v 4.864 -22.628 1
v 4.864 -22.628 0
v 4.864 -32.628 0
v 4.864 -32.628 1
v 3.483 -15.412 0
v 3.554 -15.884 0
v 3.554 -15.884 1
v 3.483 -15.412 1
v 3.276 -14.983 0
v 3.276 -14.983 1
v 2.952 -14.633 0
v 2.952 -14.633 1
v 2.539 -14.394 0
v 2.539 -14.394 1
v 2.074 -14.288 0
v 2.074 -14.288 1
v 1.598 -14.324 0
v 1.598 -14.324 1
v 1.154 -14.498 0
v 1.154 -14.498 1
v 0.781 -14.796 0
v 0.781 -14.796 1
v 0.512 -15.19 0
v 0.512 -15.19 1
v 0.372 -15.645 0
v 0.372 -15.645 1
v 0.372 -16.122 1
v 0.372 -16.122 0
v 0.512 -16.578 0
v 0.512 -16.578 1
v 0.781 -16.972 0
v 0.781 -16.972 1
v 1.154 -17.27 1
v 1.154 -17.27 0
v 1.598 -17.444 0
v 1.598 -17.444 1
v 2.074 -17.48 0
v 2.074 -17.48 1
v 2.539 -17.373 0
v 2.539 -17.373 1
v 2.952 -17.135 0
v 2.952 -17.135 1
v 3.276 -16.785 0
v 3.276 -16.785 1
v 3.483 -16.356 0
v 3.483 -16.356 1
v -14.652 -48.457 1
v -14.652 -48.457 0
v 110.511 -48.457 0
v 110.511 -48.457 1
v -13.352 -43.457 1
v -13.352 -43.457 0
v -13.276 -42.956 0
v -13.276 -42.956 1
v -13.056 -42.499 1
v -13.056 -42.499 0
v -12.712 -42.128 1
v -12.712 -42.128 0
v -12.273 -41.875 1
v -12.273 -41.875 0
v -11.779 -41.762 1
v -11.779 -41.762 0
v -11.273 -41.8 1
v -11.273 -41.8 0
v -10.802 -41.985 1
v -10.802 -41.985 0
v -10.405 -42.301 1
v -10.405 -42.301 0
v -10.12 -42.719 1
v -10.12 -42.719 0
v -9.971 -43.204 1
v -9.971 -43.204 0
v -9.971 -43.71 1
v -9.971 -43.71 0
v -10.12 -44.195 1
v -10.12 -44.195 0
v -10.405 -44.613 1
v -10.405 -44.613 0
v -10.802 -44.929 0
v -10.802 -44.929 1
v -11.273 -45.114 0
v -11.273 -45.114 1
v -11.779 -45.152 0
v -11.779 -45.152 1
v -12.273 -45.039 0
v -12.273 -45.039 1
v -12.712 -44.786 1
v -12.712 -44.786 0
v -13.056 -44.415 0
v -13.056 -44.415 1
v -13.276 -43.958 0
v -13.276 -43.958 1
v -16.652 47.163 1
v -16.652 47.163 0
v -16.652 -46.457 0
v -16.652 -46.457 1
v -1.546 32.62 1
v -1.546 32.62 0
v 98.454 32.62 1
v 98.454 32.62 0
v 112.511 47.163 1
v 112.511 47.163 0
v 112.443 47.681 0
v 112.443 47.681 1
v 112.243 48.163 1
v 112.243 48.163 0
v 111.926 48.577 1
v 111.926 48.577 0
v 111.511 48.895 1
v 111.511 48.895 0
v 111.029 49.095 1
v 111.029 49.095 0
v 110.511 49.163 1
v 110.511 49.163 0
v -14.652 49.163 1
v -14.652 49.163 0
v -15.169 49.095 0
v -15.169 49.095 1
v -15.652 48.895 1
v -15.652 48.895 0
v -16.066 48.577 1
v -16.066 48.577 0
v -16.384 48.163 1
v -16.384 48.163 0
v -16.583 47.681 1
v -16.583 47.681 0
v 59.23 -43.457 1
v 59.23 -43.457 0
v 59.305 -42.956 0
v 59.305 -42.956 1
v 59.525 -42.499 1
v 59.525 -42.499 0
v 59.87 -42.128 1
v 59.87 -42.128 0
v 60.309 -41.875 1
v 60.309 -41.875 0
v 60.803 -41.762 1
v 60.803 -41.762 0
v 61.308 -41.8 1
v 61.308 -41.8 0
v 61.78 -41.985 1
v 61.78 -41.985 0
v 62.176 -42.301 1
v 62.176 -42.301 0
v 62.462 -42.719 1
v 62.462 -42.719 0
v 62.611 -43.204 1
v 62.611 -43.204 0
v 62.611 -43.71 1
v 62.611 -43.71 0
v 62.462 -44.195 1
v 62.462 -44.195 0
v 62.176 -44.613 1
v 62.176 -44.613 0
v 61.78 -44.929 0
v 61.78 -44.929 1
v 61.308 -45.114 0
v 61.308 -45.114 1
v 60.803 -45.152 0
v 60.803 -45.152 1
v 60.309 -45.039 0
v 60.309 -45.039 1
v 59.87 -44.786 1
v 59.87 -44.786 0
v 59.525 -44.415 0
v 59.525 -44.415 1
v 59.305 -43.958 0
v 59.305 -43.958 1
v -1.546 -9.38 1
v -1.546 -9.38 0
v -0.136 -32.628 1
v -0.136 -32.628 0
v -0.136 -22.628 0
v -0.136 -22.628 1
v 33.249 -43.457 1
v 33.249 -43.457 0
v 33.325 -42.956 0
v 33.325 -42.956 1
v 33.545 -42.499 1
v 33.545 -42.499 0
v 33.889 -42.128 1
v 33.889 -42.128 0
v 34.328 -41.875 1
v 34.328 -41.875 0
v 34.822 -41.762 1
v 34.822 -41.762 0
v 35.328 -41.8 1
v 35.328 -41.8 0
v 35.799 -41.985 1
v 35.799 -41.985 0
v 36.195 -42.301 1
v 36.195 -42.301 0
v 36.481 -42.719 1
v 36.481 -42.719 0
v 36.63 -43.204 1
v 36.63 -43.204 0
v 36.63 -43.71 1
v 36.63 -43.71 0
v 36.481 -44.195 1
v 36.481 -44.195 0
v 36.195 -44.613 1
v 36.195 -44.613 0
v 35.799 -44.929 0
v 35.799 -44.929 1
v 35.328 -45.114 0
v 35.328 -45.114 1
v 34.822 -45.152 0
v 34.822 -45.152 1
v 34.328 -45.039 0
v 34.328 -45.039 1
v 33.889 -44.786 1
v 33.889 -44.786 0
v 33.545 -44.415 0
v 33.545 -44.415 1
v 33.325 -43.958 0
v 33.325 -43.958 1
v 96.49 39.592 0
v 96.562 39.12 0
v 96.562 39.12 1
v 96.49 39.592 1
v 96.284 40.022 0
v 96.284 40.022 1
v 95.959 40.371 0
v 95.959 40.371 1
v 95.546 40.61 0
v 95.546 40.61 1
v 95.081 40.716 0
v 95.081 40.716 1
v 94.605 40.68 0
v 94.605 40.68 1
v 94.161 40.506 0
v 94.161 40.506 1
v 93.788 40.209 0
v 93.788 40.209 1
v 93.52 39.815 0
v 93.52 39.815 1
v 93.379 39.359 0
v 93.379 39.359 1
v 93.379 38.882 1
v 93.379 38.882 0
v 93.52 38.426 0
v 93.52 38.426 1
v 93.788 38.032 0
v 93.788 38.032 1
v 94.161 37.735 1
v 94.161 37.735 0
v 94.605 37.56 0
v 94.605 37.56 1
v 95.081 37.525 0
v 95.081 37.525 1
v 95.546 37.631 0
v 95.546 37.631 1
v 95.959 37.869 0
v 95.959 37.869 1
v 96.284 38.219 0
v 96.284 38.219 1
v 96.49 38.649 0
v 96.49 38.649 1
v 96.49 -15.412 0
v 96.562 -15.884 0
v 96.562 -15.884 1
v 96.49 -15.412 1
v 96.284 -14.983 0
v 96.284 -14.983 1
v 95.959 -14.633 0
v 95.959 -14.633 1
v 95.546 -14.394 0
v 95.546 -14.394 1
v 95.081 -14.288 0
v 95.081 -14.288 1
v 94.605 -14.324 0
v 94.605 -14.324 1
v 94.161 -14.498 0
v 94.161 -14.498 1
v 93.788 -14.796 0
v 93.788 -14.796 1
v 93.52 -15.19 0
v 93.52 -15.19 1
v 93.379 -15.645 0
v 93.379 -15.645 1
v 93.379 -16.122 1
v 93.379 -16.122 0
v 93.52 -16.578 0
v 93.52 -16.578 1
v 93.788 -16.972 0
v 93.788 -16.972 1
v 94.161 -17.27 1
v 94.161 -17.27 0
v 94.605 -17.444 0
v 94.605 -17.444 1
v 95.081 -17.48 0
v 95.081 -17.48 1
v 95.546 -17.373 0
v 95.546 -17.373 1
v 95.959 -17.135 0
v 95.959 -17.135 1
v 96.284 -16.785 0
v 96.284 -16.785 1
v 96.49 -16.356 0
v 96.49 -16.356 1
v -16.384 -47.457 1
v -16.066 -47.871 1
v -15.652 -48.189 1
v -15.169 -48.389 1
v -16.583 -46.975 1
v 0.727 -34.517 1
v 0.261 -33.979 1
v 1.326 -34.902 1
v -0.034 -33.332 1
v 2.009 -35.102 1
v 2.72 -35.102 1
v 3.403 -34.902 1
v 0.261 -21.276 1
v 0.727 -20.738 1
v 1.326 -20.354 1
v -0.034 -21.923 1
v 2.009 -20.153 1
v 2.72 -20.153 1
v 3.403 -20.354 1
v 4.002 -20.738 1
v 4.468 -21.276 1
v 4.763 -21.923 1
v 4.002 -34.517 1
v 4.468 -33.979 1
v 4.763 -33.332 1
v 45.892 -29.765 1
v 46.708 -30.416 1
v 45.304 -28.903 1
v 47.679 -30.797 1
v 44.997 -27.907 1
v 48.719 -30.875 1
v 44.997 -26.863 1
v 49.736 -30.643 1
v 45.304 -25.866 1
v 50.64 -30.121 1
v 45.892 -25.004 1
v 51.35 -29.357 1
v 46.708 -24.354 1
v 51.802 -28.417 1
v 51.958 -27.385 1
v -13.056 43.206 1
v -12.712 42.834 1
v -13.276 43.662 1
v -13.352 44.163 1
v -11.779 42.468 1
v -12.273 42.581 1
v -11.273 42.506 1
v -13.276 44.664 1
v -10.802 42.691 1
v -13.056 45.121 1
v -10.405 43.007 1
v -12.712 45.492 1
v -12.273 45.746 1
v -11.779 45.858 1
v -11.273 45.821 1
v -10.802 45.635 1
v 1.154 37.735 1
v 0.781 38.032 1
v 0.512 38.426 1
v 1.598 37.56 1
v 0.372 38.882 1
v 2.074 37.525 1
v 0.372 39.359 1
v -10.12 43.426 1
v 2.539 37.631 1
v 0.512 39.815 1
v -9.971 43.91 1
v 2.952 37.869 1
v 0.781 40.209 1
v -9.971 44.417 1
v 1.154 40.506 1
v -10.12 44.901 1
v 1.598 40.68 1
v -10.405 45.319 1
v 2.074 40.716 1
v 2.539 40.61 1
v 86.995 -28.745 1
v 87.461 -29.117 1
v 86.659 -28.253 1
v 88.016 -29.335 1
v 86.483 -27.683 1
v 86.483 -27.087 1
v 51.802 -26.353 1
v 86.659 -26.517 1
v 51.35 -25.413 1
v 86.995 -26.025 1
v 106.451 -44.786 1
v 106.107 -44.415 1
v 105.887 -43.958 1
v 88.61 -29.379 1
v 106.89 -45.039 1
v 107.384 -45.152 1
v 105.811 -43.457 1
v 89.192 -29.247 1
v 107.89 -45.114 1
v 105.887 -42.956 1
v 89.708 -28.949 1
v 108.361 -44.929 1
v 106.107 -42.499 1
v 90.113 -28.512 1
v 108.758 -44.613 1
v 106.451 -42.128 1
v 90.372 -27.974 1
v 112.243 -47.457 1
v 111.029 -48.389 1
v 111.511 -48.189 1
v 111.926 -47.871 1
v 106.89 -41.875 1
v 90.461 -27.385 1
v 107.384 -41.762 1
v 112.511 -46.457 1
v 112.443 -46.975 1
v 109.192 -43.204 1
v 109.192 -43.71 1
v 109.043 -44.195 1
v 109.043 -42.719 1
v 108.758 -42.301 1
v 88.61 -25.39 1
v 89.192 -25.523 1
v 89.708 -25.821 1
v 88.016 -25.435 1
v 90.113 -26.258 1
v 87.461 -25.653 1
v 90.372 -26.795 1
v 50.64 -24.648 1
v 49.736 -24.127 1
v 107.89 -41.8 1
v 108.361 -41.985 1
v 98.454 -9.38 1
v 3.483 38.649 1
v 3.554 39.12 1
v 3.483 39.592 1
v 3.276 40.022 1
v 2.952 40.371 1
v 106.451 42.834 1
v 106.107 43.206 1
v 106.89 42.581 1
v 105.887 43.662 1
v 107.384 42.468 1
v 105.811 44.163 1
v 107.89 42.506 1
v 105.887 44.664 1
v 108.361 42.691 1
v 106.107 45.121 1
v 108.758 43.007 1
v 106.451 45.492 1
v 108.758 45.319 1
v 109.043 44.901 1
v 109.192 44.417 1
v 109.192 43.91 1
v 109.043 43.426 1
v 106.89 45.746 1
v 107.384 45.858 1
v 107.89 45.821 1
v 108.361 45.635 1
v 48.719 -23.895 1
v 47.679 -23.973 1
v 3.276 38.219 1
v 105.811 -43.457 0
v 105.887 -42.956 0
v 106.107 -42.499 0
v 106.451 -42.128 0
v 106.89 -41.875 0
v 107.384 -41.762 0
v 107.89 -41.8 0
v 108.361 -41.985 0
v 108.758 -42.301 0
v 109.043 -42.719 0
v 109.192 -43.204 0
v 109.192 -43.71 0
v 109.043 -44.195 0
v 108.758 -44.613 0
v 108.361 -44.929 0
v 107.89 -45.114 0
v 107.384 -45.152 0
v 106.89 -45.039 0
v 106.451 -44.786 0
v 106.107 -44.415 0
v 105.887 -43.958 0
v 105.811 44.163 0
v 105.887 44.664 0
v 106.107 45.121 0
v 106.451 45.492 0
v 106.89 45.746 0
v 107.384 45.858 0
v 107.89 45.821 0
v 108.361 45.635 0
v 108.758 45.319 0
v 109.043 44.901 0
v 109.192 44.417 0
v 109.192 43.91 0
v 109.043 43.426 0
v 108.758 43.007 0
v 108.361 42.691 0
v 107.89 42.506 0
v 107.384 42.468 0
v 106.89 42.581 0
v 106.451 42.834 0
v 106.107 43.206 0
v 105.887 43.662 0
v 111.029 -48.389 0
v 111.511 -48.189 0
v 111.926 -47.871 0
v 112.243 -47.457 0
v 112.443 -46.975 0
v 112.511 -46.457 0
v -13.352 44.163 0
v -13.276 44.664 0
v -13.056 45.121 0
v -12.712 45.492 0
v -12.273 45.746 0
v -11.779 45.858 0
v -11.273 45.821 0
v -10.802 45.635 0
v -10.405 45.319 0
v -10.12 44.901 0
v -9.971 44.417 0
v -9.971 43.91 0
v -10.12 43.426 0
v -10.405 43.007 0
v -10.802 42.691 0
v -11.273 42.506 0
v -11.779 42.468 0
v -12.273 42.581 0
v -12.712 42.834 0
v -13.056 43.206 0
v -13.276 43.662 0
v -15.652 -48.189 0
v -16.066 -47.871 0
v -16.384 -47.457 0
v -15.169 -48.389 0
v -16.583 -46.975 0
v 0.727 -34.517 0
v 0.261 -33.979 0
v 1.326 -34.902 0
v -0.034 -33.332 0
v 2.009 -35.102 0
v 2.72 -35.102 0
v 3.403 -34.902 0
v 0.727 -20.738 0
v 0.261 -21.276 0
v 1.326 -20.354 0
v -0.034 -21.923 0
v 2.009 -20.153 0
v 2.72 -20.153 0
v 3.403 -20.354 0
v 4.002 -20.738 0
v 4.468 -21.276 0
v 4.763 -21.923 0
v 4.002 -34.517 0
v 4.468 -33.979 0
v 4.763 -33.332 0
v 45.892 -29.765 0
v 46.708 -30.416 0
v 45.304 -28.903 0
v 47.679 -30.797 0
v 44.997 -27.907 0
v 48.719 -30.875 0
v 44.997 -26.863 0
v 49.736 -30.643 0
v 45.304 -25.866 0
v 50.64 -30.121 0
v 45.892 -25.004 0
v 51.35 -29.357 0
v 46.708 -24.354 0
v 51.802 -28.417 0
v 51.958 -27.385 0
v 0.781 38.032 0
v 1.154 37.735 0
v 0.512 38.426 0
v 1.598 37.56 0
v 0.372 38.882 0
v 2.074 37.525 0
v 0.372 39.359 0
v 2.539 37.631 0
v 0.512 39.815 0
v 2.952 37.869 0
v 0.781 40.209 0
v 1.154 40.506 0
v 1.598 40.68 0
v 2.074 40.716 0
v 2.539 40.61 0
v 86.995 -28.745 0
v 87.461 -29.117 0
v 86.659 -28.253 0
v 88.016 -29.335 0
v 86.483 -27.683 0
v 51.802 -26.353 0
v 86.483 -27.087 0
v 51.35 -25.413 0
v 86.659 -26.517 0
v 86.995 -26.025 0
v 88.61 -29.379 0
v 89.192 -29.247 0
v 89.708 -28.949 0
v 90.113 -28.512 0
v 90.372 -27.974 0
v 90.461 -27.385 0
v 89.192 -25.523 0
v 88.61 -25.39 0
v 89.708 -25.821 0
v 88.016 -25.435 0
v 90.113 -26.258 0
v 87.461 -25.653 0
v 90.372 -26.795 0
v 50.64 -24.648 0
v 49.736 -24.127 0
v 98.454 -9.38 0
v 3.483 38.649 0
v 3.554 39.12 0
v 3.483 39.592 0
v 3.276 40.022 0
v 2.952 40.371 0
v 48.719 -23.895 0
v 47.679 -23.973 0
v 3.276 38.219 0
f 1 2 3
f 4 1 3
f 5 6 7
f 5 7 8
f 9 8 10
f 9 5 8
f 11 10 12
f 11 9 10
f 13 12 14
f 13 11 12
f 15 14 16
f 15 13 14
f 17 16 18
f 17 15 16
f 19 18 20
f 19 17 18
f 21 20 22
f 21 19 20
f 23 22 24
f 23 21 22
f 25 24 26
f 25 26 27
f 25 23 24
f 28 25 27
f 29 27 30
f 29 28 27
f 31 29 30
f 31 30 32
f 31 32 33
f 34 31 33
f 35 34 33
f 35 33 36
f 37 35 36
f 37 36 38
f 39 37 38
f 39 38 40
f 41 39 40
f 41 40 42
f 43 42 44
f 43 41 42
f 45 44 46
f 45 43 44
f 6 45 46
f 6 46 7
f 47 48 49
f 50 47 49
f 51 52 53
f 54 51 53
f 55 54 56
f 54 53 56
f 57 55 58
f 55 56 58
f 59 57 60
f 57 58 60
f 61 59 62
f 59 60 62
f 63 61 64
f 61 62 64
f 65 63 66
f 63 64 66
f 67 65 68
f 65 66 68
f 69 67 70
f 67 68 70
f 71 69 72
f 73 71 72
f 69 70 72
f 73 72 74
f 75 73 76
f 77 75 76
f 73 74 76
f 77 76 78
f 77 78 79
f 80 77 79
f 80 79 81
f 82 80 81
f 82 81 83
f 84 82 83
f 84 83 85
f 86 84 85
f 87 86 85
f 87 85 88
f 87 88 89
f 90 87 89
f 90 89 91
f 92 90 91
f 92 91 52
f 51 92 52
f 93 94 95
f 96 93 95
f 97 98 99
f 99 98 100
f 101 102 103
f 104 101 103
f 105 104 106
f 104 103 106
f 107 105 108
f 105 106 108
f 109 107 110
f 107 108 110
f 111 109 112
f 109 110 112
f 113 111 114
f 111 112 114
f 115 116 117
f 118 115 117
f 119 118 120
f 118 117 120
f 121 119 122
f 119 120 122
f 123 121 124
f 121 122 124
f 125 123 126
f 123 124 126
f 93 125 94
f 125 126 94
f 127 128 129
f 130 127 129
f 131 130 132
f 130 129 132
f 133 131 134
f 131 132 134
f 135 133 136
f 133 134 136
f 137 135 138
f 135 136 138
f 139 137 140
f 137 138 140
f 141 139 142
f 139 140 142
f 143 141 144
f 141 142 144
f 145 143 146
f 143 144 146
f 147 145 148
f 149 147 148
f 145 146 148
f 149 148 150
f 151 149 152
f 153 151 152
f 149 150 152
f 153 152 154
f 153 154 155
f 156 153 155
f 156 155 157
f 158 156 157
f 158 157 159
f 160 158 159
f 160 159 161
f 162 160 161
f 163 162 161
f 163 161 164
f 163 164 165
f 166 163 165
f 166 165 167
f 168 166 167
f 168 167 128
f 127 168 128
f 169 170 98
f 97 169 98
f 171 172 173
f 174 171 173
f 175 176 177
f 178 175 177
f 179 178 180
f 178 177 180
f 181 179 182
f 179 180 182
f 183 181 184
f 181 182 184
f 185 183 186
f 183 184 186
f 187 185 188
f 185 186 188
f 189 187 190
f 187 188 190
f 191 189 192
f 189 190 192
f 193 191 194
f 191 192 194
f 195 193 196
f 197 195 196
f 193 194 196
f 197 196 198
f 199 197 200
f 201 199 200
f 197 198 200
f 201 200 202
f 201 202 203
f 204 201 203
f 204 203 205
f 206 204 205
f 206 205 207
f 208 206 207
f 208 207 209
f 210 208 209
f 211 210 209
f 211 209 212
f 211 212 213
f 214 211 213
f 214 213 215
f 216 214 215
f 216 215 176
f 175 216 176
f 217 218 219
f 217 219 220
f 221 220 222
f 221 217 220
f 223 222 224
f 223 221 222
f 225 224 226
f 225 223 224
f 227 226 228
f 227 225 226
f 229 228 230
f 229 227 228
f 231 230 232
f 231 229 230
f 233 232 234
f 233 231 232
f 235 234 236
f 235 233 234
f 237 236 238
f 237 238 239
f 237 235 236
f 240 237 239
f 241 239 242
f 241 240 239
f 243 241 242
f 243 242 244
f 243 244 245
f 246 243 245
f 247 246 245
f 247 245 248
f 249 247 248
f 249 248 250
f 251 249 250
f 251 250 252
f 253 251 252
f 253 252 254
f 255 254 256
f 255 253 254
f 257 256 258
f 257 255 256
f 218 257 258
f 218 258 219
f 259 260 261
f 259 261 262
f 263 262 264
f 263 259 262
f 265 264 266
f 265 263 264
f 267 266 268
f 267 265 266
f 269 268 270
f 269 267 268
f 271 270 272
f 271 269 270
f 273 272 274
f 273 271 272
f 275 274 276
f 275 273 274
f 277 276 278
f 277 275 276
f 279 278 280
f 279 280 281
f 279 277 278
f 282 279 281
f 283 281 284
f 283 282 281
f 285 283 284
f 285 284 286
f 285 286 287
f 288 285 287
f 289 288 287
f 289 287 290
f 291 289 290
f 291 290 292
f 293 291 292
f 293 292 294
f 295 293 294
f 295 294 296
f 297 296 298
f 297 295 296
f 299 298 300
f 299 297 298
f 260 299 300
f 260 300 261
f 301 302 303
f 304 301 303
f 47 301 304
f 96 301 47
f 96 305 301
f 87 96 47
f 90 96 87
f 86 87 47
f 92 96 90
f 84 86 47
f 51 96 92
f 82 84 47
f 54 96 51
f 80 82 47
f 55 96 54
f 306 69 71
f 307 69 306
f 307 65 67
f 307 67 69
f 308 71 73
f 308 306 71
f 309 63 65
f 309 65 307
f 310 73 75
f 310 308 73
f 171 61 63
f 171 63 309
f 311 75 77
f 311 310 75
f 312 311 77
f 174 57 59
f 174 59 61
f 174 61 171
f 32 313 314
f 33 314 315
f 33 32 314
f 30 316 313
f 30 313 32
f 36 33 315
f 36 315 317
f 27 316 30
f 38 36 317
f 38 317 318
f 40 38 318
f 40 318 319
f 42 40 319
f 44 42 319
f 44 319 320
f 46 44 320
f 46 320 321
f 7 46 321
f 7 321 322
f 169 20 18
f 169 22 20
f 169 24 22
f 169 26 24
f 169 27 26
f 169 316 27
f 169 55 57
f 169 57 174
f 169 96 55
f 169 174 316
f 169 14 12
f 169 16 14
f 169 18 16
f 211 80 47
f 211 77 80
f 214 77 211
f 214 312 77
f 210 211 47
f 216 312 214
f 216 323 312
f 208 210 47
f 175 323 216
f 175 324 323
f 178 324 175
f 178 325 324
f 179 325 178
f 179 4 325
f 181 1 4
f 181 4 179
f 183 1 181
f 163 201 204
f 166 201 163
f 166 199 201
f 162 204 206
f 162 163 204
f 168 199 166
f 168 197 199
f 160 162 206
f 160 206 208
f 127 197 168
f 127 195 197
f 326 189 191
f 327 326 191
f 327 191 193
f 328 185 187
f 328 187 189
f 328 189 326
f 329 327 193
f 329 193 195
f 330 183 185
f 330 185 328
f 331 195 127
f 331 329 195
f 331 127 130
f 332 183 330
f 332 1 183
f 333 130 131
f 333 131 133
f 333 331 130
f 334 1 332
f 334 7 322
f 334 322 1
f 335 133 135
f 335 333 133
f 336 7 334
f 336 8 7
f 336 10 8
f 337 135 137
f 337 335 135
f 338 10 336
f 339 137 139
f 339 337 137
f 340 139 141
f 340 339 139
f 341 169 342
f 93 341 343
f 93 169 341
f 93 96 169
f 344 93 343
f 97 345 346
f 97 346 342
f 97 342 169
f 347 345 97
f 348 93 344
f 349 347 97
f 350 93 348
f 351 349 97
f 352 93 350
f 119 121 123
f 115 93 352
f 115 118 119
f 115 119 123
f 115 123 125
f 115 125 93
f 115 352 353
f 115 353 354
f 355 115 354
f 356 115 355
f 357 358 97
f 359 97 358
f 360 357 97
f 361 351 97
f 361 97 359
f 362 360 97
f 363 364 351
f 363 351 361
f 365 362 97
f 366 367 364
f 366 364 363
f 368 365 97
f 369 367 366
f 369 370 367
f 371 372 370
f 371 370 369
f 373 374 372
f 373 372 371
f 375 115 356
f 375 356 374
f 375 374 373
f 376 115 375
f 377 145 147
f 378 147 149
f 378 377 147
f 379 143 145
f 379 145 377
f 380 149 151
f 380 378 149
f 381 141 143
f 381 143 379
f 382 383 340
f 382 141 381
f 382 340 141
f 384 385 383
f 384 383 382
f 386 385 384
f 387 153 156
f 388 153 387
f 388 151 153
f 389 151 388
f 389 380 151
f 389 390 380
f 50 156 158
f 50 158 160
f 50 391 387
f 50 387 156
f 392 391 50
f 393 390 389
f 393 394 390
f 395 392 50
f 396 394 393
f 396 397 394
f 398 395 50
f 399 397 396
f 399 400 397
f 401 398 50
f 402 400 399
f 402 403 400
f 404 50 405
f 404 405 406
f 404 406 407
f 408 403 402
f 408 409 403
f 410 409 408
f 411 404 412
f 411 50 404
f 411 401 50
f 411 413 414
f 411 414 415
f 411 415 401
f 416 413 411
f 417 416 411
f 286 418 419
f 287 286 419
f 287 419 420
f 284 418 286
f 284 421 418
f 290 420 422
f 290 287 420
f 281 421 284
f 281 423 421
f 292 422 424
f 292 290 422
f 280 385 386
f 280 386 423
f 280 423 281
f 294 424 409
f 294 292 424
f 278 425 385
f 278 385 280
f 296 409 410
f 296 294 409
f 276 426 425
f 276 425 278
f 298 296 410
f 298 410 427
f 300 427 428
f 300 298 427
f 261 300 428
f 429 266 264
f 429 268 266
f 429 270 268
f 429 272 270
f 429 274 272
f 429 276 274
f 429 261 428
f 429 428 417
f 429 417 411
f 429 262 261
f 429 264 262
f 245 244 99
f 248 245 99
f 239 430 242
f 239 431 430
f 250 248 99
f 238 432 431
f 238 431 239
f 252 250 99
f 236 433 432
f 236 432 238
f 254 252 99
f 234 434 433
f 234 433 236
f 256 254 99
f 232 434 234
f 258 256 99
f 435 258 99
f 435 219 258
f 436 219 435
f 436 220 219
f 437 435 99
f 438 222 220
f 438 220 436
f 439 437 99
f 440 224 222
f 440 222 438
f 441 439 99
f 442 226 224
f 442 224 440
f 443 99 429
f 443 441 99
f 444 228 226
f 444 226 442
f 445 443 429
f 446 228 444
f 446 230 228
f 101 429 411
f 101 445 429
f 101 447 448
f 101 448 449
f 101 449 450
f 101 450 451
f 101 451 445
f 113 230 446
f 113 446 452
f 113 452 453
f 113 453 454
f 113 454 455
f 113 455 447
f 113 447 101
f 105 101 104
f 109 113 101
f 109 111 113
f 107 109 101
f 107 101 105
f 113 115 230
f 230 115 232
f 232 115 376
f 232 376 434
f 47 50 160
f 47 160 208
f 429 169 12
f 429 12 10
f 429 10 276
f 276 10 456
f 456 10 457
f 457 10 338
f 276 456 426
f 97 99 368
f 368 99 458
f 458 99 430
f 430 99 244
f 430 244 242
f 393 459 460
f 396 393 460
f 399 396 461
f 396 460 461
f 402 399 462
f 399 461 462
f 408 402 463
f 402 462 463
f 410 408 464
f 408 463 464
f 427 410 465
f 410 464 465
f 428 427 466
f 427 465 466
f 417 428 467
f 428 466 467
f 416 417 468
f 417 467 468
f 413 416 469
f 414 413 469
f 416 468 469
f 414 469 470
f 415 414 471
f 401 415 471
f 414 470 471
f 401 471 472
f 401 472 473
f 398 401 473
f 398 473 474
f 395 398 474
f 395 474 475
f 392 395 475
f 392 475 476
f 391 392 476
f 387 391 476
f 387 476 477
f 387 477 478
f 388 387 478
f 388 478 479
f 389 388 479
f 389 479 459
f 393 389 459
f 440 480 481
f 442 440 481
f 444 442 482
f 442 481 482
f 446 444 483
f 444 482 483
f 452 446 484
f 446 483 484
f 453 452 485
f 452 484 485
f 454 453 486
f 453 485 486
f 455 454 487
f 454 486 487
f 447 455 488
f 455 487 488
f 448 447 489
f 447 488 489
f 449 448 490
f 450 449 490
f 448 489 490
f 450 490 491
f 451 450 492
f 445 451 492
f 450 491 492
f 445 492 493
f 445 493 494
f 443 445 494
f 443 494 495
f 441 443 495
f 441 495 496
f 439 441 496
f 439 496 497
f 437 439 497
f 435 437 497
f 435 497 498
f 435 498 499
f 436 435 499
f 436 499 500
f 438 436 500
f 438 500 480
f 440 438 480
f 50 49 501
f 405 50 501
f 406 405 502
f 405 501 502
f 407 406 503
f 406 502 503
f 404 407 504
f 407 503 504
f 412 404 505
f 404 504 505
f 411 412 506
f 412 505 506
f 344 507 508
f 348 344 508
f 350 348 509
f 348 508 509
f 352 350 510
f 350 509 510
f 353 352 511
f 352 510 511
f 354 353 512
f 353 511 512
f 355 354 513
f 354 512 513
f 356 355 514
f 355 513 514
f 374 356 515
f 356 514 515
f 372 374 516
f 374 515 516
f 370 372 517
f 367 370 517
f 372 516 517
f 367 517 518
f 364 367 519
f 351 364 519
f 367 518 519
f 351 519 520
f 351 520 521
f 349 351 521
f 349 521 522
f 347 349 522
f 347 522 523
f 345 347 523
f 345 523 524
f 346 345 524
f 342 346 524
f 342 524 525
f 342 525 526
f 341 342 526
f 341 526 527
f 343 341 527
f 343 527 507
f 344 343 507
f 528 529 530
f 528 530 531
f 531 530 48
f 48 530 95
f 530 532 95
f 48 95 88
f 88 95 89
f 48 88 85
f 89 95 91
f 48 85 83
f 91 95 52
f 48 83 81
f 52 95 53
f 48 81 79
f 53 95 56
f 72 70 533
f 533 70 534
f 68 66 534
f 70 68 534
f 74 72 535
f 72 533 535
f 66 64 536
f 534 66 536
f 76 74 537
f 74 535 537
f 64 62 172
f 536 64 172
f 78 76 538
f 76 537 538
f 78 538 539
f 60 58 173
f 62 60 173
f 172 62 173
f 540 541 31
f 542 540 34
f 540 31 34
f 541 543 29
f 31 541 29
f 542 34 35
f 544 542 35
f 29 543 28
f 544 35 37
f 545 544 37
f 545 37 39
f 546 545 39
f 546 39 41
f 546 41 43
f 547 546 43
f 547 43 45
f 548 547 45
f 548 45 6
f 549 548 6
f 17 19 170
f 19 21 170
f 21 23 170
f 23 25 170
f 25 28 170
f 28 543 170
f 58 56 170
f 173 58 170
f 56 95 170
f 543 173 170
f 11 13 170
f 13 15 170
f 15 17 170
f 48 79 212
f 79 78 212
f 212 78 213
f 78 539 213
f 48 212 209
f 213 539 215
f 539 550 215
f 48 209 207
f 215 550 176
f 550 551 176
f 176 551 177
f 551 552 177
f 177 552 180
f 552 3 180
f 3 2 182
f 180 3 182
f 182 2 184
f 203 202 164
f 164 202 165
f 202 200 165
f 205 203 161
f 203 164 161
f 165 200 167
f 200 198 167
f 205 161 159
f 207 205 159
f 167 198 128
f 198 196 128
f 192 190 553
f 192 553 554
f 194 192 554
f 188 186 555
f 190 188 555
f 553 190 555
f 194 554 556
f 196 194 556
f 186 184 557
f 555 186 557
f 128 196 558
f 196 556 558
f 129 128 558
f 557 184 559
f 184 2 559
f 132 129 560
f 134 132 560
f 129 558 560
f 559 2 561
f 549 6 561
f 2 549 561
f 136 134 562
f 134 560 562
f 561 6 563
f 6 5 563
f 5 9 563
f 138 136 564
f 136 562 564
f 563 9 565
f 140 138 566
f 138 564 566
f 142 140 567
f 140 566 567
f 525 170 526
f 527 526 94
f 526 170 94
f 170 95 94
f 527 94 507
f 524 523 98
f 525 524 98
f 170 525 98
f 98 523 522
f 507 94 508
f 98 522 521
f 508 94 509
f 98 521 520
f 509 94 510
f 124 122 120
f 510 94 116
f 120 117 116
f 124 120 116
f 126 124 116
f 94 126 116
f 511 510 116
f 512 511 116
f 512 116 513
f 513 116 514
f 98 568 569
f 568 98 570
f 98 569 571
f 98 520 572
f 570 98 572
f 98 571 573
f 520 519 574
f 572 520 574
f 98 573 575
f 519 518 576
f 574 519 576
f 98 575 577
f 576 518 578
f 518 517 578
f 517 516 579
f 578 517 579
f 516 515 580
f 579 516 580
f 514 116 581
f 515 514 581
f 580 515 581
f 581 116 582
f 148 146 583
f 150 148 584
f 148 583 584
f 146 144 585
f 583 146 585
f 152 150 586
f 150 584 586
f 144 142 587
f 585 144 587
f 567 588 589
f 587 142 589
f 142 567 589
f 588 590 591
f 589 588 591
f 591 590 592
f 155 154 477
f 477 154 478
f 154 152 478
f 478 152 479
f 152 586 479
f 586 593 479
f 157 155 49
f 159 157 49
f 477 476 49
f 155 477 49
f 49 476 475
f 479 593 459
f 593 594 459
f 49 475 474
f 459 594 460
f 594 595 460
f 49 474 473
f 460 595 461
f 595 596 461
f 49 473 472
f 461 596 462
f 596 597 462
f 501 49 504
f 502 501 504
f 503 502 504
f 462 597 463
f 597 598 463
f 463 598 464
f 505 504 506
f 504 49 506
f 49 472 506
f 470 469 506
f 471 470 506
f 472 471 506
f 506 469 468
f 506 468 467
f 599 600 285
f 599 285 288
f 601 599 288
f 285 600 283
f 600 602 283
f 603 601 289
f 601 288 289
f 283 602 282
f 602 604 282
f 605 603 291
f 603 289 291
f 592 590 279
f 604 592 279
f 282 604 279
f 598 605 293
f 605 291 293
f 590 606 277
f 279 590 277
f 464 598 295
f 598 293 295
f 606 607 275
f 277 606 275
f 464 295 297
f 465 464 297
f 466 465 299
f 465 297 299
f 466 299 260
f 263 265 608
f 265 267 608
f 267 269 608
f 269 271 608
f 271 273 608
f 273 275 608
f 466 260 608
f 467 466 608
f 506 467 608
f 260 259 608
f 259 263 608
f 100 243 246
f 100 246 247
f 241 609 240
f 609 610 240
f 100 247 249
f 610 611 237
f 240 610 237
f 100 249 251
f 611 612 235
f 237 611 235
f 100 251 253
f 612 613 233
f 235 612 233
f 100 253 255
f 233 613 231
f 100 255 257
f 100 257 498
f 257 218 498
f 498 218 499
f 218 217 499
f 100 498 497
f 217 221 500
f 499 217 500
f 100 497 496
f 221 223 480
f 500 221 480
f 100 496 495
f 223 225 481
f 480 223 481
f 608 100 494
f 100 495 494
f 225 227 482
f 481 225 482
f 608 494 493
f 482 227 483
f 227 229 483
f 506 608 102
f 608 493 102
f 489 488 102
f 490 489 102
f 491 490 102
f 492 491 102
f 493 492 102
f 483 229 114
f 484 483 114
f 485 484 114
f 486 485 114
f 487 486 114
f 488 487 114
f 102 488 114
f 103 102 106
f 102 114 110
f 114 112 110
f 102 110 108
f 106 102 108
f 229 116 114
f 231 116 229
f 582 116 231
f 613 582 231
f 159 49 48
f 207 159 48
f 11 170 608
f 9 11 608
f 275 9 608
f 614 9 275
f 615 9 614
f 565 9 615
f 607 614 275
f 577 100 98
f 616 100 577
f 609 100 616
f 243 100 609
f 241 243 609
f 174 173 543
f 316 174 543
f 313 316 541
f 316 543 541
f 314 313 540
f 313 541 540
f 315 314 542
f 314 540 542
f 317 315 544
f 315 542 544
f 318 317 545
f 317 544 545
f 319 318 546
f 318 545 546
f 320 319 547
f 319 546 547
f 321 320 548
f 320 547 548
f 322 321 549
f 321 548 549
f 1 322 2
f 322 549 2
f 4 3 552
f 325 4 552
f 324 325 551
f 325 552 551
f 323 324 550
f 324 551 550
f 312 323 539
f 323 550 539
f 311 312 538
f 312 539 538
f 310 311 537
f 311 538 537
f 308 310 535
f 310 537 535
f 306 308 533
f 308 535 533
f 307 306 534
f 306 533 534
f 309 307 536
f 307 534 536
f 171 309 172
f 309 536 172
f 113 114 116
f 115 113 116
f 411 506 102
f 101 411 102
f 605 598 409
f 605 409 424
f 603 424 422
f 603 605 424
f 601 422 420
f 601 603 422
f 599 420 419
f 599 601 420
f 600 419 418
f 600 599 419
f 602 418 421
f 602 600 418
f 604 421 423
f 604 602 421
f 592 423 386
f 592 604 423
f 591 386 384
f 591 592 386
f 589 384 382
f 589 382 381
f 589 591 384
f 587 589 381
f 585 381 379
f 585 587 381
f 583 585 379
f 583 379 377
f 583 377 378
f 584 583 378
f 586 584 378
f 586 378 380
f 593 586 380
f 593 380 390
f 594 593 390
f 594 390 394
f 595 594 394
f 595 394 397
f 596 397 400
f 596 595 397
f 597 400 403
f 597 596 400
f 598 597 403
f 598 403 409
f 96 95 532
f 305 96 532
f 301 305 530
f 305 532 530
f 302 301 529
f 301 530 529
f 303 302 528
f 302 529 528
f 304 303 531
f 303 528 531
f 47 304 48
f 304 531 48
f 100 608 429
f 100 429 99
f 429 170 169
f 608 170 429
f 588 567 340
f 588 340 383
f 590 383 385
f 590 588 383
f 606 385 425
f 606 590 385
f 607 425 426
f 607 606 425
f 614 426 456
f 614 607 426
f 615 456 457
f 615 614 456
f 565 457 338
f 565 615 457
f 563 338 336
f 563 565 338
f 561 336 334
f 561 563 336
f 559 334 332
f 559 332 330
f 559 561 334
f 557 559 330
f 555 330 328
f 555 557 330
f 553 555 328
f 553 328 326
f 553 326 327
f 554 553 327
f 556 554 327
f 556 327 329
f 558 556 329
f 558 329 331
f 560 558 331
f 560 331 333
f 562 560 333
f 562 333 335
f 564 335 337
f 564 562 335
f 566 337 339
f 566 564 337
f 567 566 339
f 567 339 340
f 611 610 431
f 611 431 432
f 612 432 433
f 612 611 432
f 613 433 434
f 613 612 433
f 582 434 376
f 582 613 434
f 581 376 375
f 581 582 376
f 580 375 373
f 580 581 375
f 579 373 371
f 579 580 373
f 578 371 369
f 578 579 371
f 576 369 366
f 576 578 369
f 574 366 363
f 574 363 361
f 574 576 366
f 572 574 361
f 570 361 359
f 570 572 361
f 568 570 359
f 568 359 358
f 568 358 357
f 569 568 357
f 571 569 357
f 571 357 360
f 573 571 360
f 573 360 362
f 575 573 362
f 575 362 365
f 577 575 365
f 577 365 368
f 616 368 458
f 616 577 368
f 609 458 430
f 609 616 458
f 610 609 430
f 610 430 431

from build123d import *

# Parameters (mm, degrees)
BOSS_EXTRUDE1_OUTLINE_R   = 1.600127185
BOSS_EXTRUDE1_OUTLINE_R_2 = 3.5
BOSS_EXTRUDE1_OUTLINE_R_3 = 2
BOSS_EXTRUDE1_OUTLINE_W   = 100
BOSS_EXTRUDE1_OUTLINE_H   = 42
BOSS_EXTRUDE1_DEPTH       = 1
M3_CLEARANCE_HOLE1_D      = 3.4
M3_CLEARANCE_HOLE1_DEPTH  = 4
M3_CLEARANCE_HOLE1_TIP    = 1.021463052


# Read off the part's stored shape, not the designer's step: Boss-Extrude1
with BuildPart() as part:
    # Boss-Extrude1 outline → Boss-Extrude1 (new body)
    with BuildSketch(Plane.XY):
        with BuildLine():
            ThreePointArc((110.511379674, -48.456994218), (111.925593237, -47.871207781), (112.511379674, -46.456994218))
            Line((112.511379674, -46.456994218), (112.511379674, 47.163183245))
            ThreePointArc((112.511379674, 47.163183245), (111.925593236, 48.577396807), (110.511379674, 49.163183245))
            Line((110.511379674, 49.163183245), (-14.651641589, 49.163183245))
            ThreePointArc((-14.651641589, 49.163183245), (-16.065855151, 48.577396807), (-16.651641589, 47.163183245))
            Line((-16.651641589, 47.163183245), (-16.651641589, -46.456994218))
            ThreePointArc((-16.651641589, -46.456994218), (-16.065855152, -47.871207781), (-14.651641589, -48.456994218))
            Line((-14.651641589, -48.456994218), (110.511379674, -48.456994218))
        make_face()
        with BuildLine():
            Line((4.864408455, -22.627663705), (4.864408455, -32.627663705))
            ThreePointArc((4.864408455, -32.627663705), (2.364408455, -35.127663705), (-0.135591545, -32.627663705))
            Line((-0.135591545, -32.627663705), (-0.135591545, -22.627663705))
            ThreePointArc((-0.135591545, -22.627663705), (2.364408455, -20.127663705), (4.864408455, -22.627663705))
        make_face(mode=Mode.SUBTRACT)
        with Locations((1.954046296, -15.88396989)):
            Circle(BOSS_EXTRUDE1_OUTLINE_R, mode=Mode.SUBTRACT)
        with Locations((48.457742604, -27.384884031)):
            Circle(BOSS_EXTRUDE1_OUTLINE_R_2, mode=Mode.SUBTRACT)
        with Locations((88.460922224, -27.384884031)):
            Circle(BOSS_EXTRUDE1_OUTLINE_R_3, mode=Mode.SUBTRACT)
        with Locations((94.961438913, -15.88396989)):
            Circle(BOSS_EXTRUDE1_OUTLINE_R, mode=Mode.SUBTRACT)
        with Locations((1.954046296, 39.120402088)):
            Circle(BOSS_EXTRUDE1_OUTLINE_R, mode=Mode.SUBTRACT)
        with Locations((48.454046296, 11.620402088)):
            Rectangle(BOSS_EXTRUDE1_OUTLINE_W, BOSS_EXTRUDE1_OUTLINE_H, mode=Mode.SUBTRACT)
        with Locations((94.961438913, 39.120402088)):
            Circle(BOSS_EXTRUDE1_OUTLINE_R, mode=Mode.SUBTRACT)
    extrude(amount=BOSS_EXTRUDE1_DEPTH)

    # M3 Clearance Hole1
    with Locations(Plane.XY.offset(1)):
        with Locations((-11.651641589, 44.163183245), (-11.651641589, -43.456994218), (107.511379674, -43.456994218), (107.511379674, 44.163183245), (34.949251299, -43.456994218), (60.929869042, -43.456994218)):
            Hole(M3_CLEARANCE_HOLE1_D / 2, depth=M3_CLEARANCE_HOLE1_DEPTH)
            with Locations((0, 0, -(M3_CLEARANCE_HOLE1_DEPTH + M3_CLEARANCE_HOLE1_TIP / 2))):  # 118° drill point
                Cone(0, M3_CLEARANCE_HOLE1_D / 2, M3_CLEARANCE_HOLE1_TIP, mode=Mode.SUBTRACT)


solid = part.part
